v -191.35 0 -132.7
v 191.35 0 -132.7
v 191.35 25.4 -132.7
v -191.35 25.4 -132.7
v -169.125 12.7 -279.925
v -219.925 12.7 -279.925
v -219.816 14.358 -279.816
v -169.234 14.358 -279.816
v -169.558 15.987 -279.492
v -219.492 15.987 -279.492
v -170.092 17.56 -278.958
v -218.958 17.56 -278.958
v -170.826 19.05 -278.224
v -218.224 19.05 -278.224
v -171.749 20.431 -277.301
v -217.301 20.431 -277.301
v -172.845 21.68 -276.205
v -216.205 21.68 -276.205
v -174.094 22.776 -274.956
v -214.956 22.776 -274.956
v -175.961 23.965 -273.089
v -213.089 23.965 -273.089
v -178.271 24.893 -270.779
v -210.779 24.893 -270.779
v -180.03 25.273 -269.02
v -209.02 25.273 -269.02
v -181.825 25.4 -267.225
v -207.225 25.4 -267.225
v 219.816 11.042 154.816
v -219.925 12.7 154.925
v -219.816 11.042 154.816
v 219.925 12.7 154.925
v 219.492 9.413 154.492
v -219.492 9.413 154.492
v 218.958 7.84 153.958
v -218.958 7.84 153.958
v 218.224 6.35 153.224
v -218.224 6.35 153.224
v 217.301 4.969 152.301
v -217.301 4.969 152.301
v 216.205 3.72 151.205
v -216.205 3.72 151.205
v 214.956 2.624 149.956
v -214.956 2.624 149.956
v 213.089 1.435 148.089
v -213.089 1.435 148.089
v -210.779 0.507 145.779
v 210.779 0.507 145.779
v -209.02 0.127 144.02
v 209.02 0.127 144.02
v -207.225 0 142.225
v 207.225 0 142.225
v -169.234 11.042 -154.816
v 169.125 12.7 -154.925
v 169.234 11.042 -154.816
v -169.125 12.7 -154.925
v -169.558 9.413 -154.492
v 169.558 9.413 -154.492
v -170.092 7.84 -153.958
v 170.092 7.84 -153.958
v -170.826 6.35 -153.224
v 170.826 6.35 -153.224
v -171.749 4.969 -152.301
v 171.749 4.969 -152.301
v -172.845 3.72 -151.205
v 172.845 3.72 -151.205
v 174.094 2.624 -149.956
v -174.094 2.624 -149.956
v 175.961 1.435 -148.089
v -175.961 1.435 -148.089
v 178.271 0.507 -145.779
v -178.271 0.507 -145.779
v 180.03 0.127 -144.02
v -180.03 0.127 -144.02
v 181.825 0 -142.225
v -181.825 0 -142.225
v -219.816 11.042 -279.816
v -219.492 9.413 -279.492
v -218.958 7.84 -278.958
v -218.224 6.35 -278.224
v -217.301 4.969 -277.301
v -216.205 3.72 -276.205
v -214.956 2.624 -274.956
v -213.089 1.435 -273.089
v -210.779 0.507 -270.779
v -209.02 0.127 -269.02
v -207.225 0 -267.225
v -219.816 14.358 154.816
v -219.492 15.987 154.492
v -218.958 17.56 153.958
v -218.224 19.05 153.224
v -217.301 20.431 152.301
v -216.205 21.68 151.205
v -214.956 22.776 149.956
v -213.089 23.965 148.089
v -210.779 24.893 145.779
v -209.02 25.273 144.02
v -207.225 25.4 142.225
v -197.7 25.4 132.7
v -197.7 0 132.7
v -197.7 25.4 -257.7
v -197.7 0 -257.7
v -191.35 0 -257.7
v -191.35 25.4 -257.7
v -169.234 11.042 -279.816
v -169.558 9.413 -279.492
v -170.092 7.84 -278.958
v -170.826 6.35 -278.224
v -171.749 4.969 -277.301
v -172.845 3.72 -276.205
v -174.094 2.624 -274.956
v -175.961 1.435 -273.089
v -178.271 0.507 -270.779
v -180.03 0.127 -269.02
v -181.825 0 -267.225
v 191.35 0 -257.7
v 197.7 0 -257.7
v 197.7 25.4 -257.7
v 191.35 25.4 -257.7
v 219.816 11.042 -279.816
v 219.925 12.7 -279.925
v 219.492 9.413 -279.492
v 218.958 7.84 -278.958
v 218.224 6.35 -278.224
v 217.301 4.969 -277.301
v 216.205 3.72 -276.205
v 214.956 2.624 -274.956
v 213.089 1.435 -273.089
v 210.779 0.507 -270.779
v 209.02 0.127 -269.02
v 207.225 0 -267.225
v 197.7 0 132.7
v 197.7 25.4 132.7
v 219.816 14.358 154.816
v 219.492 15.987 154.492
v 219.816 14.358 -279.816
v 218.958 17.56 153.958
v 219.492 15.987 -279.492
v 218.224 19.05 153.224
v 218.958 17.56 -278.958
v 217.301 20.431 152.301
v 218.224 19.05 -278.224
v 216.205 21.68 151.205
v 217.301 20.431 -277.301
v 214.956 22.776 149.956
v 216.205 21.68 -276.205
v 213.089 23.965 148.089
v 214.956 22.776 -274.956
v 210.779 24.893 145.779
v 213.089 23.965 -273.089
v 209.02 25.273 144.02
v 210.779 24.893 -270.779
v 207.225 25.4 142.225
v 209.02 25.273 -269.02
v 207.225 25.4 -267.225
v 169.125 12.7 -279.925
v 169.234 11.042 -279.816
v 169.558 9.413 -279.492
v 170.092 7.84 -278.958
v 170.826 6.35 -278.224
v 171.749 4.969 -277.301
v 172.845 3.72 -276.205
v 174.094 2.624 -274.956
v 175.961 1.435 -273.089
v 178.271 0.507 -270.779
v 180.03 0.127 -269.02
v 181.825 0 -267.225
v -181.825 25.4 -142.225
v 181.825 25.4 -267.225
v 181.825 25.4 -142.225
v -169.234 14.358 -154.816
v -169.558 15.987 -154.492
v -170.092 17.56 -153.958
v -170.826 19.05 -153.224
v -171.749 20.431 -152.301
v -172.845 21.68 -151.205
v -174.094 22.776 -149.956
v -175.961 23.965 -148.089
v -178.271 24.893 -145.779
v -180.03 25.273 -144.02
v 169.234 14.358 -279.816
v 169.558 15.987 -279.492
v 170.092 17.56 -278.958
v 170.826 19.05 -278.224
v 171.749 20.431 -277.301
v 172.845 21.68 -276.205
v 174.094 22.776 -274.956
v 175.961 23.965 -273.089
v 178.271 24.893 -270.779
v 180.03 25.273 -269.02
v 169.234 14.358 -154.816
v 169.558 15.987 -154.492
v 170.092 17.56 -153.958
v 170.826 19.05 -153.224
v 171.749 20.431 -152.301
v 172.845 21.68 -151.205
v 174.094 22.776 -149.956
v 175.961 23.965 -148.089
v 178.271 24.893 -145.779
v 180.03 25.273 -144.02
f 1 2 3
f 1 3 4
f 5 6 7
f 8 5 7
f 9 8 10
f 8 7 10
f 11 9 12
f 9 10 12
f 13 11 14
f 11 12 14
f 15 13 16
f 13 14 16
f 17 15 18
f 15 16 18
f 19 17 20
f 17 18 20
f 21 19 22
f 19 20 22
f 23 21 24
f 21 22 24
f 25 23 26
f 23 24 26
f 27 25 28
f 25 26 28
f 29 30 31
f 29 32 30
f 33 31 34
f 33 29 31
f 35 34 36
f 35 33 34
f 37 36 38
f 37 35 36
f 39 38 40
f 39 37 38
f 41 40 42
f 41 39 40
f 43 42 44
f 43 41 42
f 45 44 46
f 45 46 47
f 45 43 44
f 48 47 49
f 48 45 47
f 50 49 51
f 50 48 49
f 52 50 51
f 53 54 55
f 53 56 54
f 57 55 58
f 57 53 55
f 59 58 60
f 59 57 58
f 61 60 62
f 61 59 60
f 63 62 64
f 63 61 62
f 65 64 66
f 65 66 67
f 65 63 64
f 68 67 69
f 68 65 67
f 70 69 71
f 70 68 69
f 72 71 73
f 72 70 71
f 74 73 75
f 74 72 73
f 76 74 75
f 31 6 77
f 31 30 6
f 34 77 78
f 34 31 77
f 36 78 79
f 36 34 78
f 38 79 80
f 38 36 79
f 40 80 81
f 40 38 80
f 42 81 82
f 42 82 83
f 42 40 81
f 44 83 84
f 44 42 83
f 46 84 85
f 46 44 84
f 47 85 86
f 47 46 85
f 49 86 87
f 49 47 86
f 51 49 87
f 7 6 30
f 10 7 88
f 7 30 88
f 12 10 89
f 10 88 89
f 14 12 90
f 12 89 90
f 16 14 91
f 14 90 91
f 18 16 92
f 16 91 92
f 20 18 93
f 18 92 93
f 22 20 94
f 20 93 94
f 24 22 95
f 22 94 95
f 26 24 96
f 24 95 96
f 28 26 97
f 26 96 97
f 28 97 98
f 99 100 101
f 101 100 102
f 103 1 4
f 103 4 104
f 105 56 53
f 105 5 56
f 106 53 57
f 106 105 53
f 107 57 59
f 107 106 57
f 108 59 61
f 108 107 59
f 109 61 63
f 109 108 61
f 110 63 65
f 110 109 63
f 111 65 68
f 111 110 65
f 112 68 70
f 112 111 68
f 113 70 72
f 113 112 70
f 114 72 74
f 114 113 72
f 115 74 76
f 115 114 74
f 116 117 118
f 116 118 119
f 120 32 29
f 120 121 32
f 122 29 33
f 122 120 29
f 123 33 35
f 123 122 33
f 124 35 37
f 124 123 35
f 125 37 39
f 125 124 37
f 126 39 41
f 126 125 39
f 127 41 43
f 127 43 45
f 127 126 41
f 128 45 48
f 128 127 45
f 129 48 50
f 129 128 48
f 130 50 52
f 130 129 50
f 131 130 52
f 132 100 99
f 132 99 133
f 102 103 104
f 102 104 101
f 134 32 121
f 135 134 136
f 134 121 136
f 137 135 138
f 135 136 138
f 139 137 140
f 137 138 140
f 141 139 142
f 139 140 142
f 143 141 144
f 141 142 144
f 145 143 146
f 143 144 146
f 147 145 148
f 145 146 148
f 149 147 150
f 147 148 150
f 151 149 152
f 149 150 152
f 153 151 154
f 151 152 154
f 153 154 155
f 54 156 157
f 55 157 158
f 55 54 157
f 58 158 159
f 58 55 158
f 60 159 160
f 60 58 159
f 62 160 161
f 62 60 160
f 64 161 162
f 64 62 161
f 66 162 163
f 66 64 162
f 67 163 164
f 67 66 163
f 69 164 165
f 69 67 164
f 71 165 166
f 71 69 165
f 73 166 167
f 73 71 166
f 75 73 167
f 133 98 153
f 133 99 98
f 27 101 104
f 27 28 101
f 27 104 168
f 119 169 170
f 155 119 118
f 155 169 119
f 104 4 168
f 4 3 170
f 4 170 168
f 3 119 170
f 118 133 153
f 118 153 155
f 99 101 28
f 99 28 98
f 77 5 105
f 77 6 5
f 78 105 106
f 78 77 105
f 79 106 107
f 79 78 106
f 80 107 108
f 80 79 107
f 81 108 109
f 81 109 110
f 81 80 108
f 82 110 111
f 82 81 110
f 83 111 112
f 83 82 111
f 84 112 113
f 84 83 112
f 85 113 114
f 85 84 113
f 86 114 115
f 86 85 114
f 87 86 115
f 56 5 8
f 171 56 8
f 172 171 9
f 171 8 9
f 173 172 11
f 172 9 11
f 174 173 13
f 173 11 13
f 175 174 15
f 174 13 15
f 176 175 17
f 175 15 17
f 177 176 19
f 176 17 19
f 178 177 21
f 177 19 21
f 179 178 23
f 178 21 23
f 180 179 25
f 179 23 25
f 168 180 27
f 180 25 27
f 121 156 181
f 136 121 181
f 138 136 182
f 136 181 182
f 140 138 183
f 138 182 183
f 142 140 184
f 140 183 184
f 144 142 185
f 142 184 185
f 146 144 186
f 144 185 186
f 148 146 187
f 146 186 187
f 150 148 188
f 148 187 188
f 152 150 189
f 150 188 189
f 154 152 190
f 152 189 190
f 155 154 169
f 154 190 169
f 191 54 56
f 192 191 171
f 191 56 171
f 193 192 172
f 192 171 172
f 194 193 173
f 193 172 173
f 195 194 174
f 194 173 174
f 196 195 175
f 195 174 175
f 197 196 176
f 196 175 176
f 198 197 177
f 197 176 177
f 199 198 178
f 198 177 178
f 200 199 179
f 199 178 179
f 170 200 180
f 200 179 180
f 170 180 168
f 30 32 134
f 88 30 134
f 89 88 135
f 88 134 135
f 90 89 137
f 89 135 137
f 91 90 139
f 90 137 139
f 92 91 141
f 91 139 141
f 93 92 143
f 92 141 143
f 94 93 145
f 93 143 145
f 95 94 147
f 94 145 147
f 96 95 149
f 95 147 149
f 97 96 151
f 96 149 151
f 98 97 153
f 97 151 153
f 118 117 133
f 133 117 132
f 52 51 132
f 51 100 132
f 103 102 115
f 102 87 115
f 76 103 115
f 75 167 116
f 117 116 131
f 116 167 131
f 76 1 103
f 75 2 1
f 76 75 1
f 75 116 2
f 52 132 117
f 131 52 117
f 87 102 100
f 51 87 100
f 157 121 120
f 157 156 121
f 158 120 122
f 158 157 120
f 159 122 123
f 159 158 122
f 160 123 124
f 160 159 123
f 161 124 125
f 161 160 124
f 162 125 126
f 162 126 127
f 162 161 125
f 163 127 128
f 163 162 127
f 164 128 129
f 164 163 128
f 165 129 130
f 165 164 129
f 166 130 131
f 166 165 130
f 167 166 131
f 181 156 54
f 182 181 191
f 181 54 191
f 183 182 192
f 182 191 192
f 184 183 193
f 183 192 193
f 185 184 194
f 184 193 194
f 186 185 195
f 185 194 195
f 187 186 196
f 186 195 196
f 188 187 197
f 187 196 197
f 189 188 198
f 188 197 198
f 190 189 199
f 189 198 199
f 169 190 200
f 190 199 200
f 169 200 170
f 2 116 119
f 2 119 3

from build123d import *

# Parameters (mm, degrees)
BOSS_EXTRUDE1_DEPTH = 25.4
FILLET1_R           = 12.7


with BuildPart() as part:
    # Sketch2 → Boss-Extrude1 (new body)
    with BuildSketch(Plane(origin=(0, 0, 0), x_dir=(1, 0, 0), z_dir=(0, 1, 0))):
        Polygon((-219.925, -154.925), (219.925, -154.925), (219.925, 132.7), (219.925, 279.925000096), (169.125, 279.925000096), (169.125, 154.925), (-169.125, 154.925), (-169.125, 279.925000096), (-219.925, 279.925000096), (-219.925, 132.7), align=None)
        Polygon((-191.35, 132.7), (-191.35, 257.700000096), (-197.7, 257.700000096), (-197.7, 132.7), (-197.7, -132.7), (197.7, -132.7), (197.7, 132.7), (197.7, 257.700000096), (191.35, 257.700000096), (191.35, 132.7), align=None, mode=Mode.SUBTRACT)
    extrude(amount=BOSS_EXTRUDE1_DEPTH)

    # Fillet1
    fillet1_edges = [part.edges().sort_by_distance(p)[0] for p in [
        (0, 0, 154.925),
        (0, 25.4, 154.925),
        (-219.925, 0, -62.500000048),
        (-194.525, 0, -279.925000096),
        (-219.925, 25.4, -62.500000048),
        (-194.525, 25.4, -279.925000096),
        (-169.125, 0, -217.425000048),
        (-169.125, 25.4, -217.425000048),
        (0, 0, -154.925),
        (0, 25.4, -154.925),
        (219.925, 0, -62.500000048),
        (219.925, 25.4, -62.500000048),
        (194.525, 0, -279.925000096),
        (194.525, 25.4, -279.925000096),
        (169.125, 0, -217.425000048),
        (169.125, 25.4, -217.425000048),
    ]]
    fillet(fillet1_edges, radius=FILLET1_R - 0.0001)  # a hair under: the kernel refuses the full size


solid = part.part
